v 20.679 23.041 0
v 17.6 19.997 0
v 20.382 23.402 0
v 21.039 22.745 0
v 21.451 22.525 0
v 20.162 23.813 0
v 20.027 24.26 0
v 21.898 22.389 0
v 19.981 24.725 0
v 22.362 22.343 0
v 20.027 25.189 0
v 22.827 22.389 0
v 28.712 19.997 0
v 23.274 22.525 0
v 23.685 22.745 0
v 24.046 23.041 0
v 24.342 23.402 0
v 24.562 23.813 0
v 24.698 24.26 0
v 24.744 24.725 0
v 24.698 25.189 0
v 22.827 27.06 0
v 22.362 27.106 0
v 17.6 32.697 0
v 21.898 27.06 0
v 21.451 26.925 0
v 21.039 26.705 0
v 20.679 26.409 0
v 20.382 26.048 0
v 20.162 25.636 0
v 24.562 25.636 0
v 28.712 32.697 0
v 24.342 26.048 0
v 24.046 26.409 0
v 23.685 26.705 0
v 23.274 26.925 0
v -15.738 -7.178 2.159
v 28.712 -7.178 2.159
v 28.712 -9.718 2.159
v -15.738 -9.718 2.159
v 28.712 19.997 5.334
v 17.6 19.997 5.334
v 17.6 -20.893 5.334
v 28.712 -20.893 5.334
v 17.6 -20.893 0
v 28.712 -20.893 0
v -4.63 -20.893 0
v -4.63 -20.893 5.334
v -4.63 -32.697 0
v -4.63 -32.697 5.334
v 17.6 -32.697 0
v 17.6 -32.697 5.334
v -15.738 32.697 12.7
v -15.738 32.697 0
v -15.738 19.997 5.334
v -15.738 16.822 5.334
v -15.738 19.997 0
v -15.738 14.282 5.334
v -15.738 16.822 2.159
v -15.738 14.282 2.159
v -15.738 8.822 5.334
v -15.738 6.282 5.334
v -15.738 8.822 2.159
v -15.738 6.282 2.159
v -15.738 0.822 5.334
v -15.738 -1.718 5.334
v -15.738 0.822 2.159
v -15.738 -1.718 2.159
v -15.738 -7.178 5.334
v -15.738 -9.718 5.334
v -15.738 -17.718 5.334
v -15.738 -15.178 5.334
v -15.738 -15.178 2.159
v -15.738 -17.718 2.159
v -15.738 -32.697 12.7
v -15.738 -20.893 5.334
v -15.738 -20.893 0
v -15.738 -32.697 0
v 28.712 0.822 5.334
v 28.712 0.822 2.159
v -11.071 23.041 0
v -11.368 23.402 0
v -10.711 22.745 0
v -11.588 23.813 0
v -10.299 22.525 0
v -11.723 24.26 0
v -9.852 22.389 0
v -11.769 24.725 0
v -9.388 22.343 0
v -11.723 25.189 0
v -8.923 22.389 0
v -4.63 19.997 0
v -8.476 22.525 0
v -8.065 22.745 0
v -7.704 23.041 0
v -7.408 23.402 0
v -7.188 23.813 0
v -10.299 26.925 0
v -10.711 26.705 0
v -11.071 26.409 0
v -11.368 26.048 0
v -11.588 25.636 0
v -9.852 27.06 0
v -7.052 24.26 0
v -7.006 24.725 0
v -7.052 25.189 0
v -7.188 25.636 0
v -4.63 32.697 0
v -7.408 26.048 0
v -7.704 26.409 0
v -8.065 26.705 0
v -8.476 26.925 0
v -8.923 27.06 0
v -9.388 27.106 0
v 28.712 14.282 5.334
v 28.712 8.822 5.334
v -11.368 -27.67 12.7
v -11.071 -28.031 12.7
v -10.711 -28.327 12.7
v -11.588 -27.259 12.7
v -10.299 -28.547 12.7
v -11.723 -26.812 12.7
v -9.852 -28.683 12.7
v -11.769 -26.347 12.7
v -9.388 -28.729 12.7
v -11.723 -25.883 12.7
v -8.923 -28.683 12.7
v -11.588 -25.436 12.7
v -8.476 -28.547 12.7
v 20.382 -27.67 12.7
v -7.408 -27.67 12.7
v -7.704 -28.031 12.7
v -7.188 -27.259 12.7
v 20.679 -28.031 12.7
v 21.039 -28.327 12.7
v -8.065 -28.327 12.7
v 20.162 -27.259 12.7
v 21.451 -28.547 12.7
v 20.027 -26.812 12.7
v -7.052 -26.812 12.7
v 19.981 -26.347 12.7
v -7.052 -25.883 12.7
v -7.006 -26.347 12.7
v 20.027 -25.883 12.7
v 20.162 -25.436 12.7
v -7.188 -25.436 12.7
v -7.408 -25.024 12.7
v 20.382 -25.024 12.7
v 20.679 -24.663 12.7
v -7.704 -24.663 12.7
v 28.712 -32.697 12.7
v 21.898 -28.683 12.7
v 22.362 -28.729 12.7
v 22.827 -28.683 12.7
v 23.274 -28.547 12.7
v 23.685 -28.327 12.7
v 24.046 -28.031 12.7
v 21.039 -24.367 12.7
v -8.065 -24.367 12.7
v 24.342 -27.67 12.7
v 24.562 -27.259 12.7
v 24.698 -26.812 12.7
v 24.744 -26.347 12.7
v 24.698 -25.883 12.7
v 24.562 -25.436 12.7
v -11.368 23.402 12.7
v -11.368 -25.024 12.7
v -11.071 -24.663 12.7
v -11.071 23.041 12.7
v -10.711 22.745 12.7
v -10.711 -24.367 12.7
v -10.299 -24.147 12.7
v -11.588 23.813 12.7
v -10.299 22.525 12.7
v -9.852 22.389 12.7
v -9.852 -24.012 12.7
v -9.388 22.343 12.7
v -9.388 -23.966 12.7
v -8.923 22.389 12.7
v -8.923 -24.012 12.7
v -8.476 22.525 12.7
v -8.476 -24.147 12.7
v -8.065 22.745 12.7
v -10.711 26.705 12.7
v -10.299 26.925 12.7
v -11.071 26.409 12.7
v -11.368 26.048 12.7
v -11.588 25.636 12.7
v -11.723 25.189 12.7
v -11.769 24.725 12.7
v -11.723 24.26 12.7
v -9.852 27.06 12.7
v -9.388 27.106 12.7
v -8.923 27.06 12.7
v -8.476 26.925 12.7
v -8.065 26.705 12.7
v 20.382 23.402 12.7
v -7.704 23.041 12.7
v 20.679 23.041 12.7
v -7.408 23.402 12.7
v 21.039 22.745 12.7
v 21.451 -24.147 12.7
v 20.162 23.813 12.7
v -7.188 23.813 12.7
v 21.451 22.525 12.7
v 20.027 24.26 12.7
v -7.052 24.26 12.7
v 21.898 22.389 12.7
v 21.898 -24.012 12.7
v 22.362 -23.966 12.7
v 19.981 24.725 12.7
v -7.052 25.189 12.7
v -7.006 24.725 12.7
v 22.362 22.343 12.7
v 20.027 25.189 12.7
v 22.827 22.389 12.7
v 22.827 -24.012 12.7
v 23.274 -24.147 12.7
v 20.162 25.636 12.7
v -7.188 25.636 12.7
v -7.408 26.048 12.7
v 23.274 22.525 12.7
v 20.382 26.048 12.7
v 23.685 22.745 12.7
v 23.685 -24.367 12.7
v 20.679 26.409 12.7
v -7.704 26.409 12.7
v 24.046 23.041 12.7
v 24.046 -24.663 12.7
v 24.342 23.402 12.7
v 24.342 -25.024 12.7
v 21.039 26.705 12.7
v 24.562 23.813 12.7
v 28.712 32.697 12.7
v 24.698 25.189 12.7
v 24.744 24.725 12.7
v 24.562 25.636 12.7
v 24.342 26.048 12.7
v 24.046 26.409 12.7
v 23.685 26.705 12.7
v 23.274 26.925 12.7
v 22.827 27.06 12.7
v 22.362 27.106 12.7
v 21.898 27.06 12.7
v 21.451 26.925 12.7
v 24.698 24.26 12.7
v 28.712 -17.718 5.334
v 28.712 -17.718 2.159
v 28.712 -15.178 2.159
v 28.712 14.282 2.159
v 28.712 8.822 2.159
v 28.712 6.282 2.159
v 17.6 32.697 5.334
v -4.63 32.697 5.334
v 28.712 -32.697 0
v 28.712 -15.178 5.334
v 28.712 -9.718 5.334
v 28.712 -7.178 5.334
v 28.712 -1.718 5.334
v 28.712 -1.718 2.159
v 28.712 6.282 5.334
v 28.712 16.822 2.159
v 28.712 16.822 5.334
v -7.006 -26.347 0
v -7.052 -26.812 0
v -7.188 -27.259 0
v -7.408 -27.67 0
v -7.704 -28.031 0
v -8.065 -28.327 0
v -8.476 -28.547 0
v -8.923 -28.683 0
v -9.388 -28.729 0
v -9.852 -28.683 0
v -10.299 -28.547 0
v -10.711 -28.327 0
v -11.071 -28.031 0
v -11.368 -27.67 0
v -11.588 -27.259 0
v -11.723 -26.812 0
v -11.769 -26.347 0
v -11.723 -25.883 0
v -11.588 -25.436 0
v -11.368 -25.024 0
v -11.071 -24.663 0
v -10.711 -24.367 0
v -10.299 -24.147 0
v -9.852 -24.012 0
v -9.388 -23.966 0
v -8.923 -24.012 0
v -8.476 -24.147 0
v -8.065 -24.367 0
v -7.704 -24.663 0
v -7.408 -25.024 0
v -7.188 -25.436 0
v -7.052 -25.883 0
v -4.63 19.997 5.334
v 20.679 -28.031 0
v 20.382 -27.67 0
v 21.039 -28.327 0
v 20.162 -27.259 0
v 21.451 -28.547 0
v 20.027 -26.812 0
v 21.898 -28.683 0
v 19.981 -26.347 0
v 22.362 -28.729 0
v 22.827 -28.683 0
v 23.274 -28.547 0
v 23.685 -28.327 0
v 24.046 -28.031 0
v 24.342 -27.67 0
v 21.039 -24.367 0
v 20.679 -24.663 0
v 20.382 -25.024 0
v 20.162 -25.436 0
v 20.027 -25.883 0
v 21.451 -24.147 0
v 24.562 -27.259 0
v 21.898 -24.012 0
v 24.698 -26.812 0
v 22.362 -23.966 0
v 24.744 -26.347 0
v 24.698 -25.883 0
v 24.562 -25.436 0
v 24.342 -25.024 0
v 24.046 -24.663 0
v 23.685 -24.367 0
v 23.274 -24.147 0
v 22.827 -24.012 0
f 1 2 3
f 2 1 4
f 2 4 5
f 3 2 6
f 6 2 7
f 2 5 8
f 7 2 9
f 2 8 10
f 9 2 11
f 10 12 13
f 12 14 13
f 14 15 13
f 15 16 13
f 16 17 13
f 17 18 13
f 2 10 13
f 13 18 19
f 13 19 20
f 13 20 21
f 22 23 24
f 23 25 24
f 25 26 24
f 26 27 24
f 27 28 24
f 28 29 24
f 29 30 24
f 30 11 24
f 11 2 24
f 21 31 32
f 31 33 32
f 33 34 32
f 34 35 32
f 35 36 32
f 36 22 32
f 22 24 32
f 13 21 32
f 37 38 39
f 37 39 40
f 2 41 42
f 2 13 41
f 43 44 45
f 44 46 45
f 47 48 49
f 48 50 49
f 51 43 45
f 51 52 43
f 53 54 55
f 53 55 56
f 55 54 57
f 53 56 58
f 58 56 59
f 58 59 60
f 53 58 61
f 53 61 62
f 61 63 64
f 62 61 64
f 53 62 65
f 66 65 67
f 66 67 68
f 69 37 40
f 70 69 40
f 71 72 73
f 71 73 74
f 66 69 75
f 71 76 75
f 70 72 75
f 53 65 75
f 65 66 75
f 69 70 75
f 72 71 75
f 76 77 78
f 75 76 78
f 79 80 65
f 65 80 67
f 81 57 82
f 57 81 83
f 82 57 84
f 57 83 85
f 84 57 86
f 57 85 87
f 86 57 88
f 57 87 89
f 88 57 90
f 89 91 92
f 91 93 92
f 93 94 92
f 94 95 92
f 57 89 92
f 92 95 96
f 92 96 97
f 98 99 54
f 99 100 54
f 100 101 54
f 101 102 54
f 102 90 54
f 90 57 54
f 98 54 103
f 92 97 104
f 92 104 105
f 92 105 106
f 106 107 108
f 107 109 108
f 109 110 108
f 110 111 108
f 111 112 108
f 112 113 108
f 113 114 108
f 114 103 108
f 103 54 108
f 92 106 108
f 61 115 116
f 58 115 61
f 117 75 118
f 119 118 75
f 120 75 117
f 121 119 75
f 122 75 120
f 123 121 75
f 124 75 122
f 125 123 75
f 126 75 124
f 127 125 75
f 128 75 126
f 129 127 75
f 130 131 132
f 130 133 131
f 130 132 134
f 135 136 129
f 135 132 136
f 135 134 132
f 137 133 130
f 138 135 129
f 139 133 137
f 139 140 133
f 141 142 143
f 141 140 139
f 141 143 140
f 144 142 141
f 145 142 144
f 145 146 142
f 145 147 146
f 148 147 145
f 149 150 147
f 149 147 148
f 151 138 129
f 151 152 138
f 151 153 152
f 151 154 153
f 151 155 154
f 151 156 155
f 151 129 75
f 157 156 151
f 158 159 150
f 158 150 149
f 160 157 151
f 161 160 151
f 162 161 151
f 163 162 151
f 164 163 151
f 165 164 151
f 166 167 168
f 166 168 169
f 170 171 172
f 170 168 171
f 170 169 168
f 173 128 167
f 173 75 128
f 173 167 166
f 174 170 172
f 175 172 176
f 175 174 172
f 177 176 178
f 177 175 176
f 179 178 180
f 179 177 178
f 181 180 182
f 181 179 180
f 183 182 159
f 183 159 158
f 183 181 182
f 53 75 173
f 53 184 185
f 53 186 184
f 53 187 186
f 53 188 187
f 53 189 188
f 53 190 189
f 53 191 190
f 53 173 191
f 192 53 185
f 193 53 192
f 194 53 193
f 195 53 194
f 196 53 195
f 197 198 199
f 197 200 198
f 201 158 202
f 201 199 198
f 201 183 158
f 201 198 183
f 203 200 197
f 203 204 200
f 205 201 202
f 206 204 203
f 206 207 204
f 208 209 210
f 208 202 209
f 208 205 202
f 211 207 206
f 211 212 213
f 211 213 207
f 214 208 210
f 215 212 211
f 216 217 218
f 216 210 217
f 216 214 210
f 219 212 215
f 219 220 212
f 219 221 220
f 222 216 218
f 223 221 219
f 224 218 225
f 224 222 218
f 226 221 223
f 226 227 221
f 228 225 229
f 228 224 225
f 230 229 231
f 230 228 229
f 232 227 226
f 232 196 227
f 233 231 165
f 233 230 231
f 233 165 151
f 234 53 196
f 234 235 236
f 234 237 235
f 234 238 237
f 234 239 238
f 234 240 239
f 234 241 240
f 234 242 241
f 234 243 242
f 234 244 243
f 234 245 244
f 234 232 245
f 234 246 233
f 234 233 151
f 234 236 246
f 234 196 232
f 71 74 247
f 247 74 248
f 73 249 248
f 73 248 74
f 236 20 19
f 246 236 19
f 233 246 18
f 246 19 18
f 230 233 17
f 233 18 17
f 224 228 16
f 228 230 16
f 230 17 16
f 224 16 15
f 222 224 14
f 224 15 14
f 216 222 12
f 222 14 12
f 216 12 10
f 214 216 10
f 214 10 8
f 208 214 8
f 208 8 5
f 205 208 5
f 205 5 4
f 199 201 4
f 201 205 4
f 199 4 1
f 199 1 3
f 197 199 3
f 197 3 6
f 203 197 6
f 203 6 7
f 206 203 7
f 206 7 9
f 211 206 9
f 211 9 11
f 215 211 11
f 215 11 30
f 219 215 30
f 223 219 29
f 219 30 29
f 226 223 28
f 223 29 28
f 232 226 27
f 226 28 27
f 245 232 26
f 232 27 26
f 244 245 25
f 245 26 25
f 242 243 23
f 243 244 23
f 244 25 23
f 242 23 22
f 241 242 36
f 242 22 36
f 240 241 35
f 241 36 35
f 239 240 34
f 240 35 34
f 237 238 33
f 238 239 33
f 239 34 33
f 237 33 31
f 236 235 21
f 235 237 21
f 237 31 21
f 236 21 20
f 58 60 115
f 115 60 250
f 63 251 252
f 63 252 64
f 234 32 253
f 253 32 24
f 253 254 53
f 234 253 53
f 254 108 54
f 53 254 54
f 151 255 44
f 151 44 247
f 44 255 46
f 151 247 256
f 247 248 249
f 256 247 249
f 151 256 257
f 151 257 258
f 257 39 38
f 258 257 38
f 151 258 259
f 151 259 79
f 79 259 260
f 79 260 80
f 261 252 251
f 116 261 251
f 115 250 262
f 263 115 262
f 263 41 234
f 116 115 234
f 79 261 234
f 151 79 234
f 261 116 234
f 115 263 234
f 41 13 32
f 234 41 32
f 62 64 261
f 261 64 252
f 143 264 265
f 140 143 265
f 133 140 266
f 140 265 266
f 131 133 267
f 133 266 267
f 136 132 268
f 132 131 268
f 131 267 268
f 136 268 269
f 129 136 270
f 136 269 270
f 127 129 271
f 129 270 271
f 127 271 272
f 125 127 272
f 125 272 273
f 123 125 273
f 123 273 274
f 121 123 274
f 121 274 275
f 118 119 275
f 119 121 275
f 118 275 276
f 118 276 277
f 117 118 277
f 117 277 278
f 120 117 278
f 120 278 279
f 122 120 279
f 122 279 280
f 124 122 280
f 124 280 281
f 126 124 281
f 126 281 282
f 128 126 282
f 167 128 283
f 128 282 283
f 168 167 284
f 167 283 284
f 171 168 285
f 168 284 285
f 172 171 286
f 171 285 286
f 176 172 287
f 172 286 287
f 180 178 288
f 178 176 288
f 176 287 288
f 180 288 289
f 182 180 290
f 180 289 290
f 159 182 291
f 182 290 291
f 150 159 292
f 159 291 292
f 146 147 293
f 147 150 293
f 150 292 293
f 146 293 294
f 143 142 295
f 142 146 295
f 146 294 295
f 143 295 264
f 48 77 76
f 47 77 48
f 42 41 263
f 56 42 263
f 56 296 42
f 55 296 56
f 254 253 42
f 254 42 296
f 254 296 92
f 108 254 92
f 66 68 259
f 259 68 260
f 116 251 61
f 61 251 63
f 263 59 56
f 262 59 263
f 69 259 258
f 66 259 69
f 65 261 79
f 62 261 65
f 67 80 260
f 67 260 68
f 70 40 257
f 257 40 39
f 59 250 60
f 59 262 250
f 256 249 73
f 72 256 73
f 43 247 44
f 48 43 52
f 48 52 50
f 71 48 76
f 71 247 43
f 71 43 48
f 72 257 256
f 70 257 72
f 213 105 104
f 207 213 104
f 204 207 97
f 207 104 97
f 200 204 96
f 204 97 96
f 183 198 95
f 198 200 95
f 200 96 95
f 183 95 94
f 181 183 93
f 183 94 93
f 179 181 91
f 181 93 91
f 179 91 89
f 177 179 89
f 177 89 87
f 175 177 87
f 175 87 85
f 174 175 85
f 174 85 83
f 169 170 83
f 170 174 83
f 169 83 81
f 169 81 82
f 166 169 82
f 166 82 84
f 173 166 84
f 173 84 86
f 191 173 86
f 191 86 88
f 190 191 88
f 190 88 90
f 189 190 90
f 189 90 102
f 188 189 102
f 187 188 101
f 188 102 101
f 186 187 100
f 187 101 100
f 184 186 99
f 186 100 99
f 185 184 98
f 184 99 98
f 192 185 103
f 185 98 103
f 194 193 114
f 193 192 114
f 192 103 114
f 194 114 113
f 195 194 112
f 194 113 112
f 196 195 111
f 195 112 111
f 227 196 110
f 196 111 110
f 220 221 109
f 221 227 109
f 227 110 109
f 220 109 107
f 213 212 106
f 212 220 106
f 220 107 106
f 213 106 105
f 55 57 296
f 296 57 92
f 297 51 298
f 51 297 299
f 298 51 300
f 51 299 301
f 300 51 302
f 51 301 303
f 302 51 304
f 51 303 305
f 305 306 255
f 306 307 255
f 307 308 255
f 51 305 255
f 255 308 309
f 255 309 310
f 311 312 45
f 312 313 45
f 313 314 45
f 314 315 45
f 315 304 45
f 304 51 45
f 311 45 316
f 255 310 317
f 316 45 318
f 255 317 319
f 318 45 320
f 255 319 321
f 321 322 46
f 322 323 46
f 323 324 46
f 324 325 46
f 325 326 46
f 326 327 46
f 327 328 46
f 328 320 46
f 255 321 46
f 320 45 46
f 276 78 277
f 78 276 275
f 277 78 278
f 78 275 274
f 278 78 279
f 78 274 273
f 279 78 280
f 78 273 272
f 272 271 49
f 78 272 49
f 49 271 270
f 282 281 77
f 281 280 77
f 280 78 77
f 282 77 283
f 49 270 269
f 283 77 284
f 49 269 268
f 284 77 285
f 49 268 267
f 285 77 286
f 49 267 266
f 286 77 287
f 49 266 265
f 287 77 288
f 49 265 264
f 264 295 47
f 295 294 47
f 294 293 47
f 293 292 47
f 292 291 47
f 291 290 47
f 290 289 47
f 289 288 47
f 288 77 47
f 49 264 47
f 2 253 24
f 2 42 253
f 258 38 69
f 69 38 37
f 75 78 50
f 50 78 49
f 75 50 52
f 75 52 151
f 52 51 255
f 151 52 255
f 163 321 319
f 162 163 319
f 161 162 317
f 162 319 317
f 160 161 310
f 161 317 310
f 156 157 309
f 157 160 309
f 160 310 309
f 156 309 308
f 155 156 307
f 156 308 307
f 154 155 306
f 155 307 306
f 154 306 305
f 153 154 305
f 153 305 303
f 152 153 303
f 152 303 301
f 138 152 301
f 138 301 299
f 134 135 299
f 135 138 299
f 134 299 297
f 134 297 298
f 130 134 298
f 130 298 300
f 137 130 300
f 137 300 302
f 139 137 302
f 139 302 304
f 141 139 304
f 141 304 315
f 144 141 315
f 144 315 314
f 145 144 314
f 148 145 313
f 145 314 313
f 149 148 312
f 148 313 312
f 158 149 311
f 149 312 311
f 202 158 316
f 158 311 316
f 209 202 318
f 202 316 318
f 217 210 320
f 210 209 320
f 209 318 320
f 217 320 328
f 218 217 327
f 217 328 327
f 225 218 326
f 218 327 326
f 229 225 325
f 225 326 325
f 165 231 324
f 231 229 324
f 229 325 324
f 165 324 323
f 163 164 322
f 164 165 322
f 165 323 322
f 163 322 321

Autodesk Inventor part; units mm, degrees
ref_plane "YZ Plane" through (0, 0, 0) normal (1, 0, 0) x (0, 1, 0)
ref_plane "XZ Plane" through (0, 0, 0) normal (0, 1, 0) x (-1, 0, 0)
sketch "Sketch1" plane through (0, 0, 0) normal (0, 0, 1) x (1, 0, 0)
  circle A0 centre (22.3624, 24.7247) radius 2.3813 projected
  circle A1 centre (22.3624, -26.3473) radius 2.3813 projected
  circle A2 centre (-9.3876, 24.7247) radius 2.3813 projected
  circle A3 centre (-9.3876, -26.3473) radius 2.3813 projected
  line L0 (28.7124, 32.6973) -> (-15.7376, 32.6973) projected
  line L1 (-15.7376, 32.6973) -> (-15.7376, -32.6973) projected
  line L2 (-15.7376, -32.6973) -> (28.7124, -32.6973) projected
  line L3 (28.7124, -32.6973) -> (28.7124, 32.6973) projected
  point P0 (0, 0)
extrude "Extrusion1" add sketch "Sketch1" along normal blind 12.7
sketch "Sketch2" plane through (-15.7376, -32.6973, 0) normal (0, -1, 0) x (1, 0, 0)
  line L0 (11.1075, 69.4178) -> (11.1075, 0)
  line L1 (33.3375, 69.1638) -> (33.3375, 0)
  line L2 (11.1075, 0) -> (33.3375, 0)
  line L3 (0, 9.525) -> (44.45, 9.525)
  line L4 (11.1075, 0) -> (33.3375, 0)
  line L5 (33.3375, 0) -> (33.3375, 5.334)
  line L6 (33.3375, 5.334) -> (11.1075, 5.334)
  line L7 (11.1075, 5.334) -> (11.1075, 0)
  line L8 (0, 0) -> (44.45, 0) projected
  point P0 (15.875, 0)
  point P1 (11.1075, 5.334)
  dimension "d2" = 5.334
  dimension "d21" = 0
extrude "Extrusion2" cut sketch "Sketch2" against normal blind 76.2 contours L6 L1 L2 L0
ref_plane "Work Plane1" through (-16.0653, -32.8267, -33.655) normal (0, 0, -1) x (0, 1, 0)
sketch "Sketch3" plane through (17.5999, -32.6973, 5.334) normal (0, 0, -1) x (-1, 0, 0)
  line L0 (0, 0) -> (0, 65.3946) projected
  line L1 (0, 46.9796) -> (22.23, 46.9796)
  line L2 (22.23, 46.9796) -> (22.23, 49.5196)
  line L3 (22.23, 49.5196) -> (0, 49.5196)
  line L4 (0, 49.5196) -> (0, 46.9796)
  line L5 (0, 65.3946) -> (22.23, 65.3946) projected
  line L6 (33.3375, 65.3946) -> (33.3375, 0) projected
  line L7 (0, 38.9796) -> (22.23, 38.9796)
  line L8 (22.23, 38.9796) -> (22.23, 41.5196)
  line L9 (22.23, 41.5196) -> (0, 41.5196)
  line L10 (0, 41.5196) -> (0, 38.9796)
  line L11 (0, 30.9796) -> (22.23, 30.9796)
  line L12 (22.23, 30.9796) -> (22.23, 33.5196)
  line L13 (22.23, 33.5196) -> (0, 33.5196)
  line L14 (0, 33.5196) -> (0, 30.9796)
  line L15 (0, 22.9796) -> (22.23, 22.9796)
  line L16 (22.23, 22.9796) -> (22.23, 25.5196)
  line L17 (22.23, 25.5196) -> (0, 25.5196)
  line L18 (0, 25.5196) -> (0, 22.9796)
  line L19 (0, 14.9796) -> (22.23, 14.9796)
  line L20 (22.23, 14.9796) -> (22.23, 17.5196)
  line L21 (22.23, 17.5196) -> (0, 17.5196)
  line L22 (0, 17.5196) -> (0, 14.9796)
  point P0 (17.5999, 32.6973)
  point P1 (0, 17.5196)
  point P2 (0, 14.9796)
  point P3 (0, 25.5196)
  point P4 (0, 22.9796)
  point P5 (0, 33.5196)
  point P6 (0, 30.9796)
  point P7 (0, 41.5196)
  point P8 (0, 38.9796)
  point P9 (0, 49.5196)
  dimension "d6" = 15.875
  dimension "d7" = 2.54
  dimension "d10" = 8
extrude "Extrusion3" add sketch "Sketch3" along normal blind 5.334
sketch "Sketch4" plane through (0, 0, 0) normal (0, 0, -1) x (-1, 0, 0)
  line L0 (4.6301, 14.2823) -> (4.6301, 16.8223)
  line L1 (15.7376, 32.6973) -> (15.7376, -32.6973) projected
  line L2 (4.6301, 16.8223) -> (15.7376, 16.8223)
  line L3 (15.7376, 16.8223) -> (15.7376, 19.9973)
  line L4 (15.7376, 19.9973) -> (4.6301, 19.9973)
  line L5 (4.6301, 19.9973) -> (4.6301, 16.8223)
  line L6 (4.6301, 14.2823) -> (4.6301, 8.8223)
  line L7 (4.6301, 6.2823) -> (4.6301, 0.8223)
  line L8 (4.6301, -1.7177) -> (4.6301, -7.1777)
  line L9 (4.6301, -9.7177) -> (4.6301, -15.1777)
  line L10 (-17.5999, 14.2823) -> (4.6301, 14.2823)
  line L11 (4.6301, 14.2823) -> (15.7376, 14.2823)
  line L12 (15.7376, 14.2823) -> (15.7376, 8.8223)
  line L13 (15.7376, 8.8223) -> (4.6301, 8.8223)
  line L14 (4.6301, 8.8223) -> (4.6301, 14.2823)
  line L15 (4.6301, 0.8223) -> (4.6301, 6.2823)
  line L16 (4.6301, 6.2823) -> (15.7376, 6.2823)
  line L17 (15.7376, 6.2823) -> (15.7376, 0.8223)
  line L18 (15.7376, 0.8223) -> (4.6301, 0.8223)
  line L19 (4.6301, 0.8223) -> (4.6301, 6.2823)
  line L20 (4.6301, -7.1777) -> (4.6301, -1.7177)
  line L21 (4.6301, -1.7177) -> (15.7376, -1.7177)
  line L22 (15.7376, -1.7177) -> (15.7376, -7.1777)
  line L23 (15.7376, -7.1777) -> (4.6301, -7.1777)
  line L24 (4.6301, -7.1777) -> (4.6301, -1.7177)
  line L25 (4.6301, -15.1777) -> (4.6301, -9.7177)
  line L26 (4.6301, -9.7177) -> (15.7376, -9.7177)
  line L27 (15.7376, -9.7177) -> (15.7376, -15.1777)
  line L28 (15.7376, -15.1777) -> (4.6301, -15.1777)
  line L29 (4.6301, -15.1777) -> (4.6301, -9.7177)
  line L30 (4.6301, -32.6973) -> (4.6301, -17.7177) projected
  line L31 (4.6301, -17.7177) -> (15.7376, -17.7177)
  line L32 (15.7376, -17.7177) -> (15.7376, -20.8927)
  line L33 (15.7376, -20.8927) -> (4.6301, -20.8927)
  line L34 (4.6301, -20.8927) -> (4.6301, -17.7177)
  line L35 (-28.7124, 32.6973) -> (15.7376, 32.6973) construction
  line L36 (-6.4874, 32.6973) -> (-6.4874, -33.4306) construction
  line L37 (-14.4, 16.8223) -> (-31.2231, 16.8223)
  line L38 (-31.2231, 16.8223) -> (-31.2231, 19.9973)
  line L39 (-31.2231, 19.9973) -> (-14.4, 19.9973)
  line L40 (-14.4, 19.9973) -> (-14.4, 16.8223)
  line L41 (-15.2764, -1.7177) -> (-15.2764, -7.1777)
  line L42 (-15.4955, -9.7177) -> (-15.4955, -15.1777)
  line L43 (-14.1435, 14.2823) -> (-30.6935, 14.2823)
  line L44 (-30.6935, 14.2823) -> (-30.6935, 8.8223)
  line L45 (-30.6935, 8.8223) -> (-16.0059, 8.8223)
  line L46 (-16.0059, 8.8223) -> (-14.1435, 14.2823)
  line L47 (-10.7606, 6.2823) -> (-30.4287, 6.2823)
  line L48 (-30.4287, 6.2823) -> (-30.4287, 0.8223)
  line L49 (-30.4287, 0.8223) -> (-15.6598, 0.8223)
  line L50 (-15.6598, 0.8223) -> (-10.7606, 6.2823)
  line L51 (-15.2764, -7.1777) -> (-15.2764, -1.7177)
  line L52 (-15.2764, -1.7177) -> (-29.0132, -1.7177)
  line L53 (-29.0132, -1.7177) -> (-29.0132, -7.1777)
  line L54 (-29.0132, -7.1777) -> (-15.2764, -7.1777)
  line L55 (-15.2764, -7.1777) -> (-15.2764, -1.7177)
  line L56 (-15.4955, -15.1777) -> (-15.4955, -9.7177)
  line L57 (-15.4955, -9.7177) -> (-29.8897, -9.7177)
  line L58 (-29.8897, -9.7177) -> (-29.8897, -15.1777)
  line L59 (-29.8897, -15.1777) -> (-15.4955, -15.1777)
  line L60 (-15.4955, -15.1777) -> (-15.4955, -9.7177)
  line L61 (-15.5503, -17.7177) -> (-32.0838, -17.7177)
  line L62 (-32.0838, -17.7177) -> (-32.0838, -20.8927)
  line L63 (-32.0838, -20.8927) -> (-15.5503, -20.8927)
  line L64 (-15.5503, -20.8927) -> (-15.5503, -17.7177)
  point P0 (0, 0)
  point P1 (-15.4955, -15.1777)
  point P2 (-15.2764, -7.1777)
  point P3 (4.6301, -20.8927)
  point P4 (15.7376, -17.7177)
  point P5 (4.6301, -15.1777)
  point P6 (15.7376, -9.7177)
  point P7 (15.7376, -1.7177)
  point P8 (4.6301, 0.8223)
  point P9 (15.7376, 6.2823)
  point P10 (4.6301, 8.8223)
  point P11 (15.7376, 14.2823)
  point P12 (15.7376, 16.8223)
  dimension "d17" = 3.175
  dimension "d18" = 3.175
extrude "Extrusion4" cut sketch "Sketch4" against normal blind 5.334 contours L1 L33 L30 L31 | L1 L28 L9 L26 | L1 L23 L8 L21 | L1 L18 L7 L16 | L11 L1 L13 L6 | L46 L45 L44 L43 L10 | L5 L4 L1 L2 | L37 L38 L39 L40 | L41 L54 L53 L52 | L42 L59 L58 L57 | L50 L49 L48 L47 | L64 L63 L62 L61
sketch "Sketch5" plane through (0, 0, 0) normal (0, 0, -1) x (-1, 0, 0)
  line L0 (17.6982, 19.0646) -> (-30.6897, 19.0646)
  line L1 (-30.6897, 19.0646) -> (-30.6897, -19.7169)
  line L2 (-30.6897, -19.7169) -> (17.6982, -19.7169)
  line L3 (17.6982, -19.7169) -> (17.6982, 19.0646)
extrude "Extrusion5" cut sketch "Sketch5" against normal blind 2.159
properties part number "Belt Clamp"
